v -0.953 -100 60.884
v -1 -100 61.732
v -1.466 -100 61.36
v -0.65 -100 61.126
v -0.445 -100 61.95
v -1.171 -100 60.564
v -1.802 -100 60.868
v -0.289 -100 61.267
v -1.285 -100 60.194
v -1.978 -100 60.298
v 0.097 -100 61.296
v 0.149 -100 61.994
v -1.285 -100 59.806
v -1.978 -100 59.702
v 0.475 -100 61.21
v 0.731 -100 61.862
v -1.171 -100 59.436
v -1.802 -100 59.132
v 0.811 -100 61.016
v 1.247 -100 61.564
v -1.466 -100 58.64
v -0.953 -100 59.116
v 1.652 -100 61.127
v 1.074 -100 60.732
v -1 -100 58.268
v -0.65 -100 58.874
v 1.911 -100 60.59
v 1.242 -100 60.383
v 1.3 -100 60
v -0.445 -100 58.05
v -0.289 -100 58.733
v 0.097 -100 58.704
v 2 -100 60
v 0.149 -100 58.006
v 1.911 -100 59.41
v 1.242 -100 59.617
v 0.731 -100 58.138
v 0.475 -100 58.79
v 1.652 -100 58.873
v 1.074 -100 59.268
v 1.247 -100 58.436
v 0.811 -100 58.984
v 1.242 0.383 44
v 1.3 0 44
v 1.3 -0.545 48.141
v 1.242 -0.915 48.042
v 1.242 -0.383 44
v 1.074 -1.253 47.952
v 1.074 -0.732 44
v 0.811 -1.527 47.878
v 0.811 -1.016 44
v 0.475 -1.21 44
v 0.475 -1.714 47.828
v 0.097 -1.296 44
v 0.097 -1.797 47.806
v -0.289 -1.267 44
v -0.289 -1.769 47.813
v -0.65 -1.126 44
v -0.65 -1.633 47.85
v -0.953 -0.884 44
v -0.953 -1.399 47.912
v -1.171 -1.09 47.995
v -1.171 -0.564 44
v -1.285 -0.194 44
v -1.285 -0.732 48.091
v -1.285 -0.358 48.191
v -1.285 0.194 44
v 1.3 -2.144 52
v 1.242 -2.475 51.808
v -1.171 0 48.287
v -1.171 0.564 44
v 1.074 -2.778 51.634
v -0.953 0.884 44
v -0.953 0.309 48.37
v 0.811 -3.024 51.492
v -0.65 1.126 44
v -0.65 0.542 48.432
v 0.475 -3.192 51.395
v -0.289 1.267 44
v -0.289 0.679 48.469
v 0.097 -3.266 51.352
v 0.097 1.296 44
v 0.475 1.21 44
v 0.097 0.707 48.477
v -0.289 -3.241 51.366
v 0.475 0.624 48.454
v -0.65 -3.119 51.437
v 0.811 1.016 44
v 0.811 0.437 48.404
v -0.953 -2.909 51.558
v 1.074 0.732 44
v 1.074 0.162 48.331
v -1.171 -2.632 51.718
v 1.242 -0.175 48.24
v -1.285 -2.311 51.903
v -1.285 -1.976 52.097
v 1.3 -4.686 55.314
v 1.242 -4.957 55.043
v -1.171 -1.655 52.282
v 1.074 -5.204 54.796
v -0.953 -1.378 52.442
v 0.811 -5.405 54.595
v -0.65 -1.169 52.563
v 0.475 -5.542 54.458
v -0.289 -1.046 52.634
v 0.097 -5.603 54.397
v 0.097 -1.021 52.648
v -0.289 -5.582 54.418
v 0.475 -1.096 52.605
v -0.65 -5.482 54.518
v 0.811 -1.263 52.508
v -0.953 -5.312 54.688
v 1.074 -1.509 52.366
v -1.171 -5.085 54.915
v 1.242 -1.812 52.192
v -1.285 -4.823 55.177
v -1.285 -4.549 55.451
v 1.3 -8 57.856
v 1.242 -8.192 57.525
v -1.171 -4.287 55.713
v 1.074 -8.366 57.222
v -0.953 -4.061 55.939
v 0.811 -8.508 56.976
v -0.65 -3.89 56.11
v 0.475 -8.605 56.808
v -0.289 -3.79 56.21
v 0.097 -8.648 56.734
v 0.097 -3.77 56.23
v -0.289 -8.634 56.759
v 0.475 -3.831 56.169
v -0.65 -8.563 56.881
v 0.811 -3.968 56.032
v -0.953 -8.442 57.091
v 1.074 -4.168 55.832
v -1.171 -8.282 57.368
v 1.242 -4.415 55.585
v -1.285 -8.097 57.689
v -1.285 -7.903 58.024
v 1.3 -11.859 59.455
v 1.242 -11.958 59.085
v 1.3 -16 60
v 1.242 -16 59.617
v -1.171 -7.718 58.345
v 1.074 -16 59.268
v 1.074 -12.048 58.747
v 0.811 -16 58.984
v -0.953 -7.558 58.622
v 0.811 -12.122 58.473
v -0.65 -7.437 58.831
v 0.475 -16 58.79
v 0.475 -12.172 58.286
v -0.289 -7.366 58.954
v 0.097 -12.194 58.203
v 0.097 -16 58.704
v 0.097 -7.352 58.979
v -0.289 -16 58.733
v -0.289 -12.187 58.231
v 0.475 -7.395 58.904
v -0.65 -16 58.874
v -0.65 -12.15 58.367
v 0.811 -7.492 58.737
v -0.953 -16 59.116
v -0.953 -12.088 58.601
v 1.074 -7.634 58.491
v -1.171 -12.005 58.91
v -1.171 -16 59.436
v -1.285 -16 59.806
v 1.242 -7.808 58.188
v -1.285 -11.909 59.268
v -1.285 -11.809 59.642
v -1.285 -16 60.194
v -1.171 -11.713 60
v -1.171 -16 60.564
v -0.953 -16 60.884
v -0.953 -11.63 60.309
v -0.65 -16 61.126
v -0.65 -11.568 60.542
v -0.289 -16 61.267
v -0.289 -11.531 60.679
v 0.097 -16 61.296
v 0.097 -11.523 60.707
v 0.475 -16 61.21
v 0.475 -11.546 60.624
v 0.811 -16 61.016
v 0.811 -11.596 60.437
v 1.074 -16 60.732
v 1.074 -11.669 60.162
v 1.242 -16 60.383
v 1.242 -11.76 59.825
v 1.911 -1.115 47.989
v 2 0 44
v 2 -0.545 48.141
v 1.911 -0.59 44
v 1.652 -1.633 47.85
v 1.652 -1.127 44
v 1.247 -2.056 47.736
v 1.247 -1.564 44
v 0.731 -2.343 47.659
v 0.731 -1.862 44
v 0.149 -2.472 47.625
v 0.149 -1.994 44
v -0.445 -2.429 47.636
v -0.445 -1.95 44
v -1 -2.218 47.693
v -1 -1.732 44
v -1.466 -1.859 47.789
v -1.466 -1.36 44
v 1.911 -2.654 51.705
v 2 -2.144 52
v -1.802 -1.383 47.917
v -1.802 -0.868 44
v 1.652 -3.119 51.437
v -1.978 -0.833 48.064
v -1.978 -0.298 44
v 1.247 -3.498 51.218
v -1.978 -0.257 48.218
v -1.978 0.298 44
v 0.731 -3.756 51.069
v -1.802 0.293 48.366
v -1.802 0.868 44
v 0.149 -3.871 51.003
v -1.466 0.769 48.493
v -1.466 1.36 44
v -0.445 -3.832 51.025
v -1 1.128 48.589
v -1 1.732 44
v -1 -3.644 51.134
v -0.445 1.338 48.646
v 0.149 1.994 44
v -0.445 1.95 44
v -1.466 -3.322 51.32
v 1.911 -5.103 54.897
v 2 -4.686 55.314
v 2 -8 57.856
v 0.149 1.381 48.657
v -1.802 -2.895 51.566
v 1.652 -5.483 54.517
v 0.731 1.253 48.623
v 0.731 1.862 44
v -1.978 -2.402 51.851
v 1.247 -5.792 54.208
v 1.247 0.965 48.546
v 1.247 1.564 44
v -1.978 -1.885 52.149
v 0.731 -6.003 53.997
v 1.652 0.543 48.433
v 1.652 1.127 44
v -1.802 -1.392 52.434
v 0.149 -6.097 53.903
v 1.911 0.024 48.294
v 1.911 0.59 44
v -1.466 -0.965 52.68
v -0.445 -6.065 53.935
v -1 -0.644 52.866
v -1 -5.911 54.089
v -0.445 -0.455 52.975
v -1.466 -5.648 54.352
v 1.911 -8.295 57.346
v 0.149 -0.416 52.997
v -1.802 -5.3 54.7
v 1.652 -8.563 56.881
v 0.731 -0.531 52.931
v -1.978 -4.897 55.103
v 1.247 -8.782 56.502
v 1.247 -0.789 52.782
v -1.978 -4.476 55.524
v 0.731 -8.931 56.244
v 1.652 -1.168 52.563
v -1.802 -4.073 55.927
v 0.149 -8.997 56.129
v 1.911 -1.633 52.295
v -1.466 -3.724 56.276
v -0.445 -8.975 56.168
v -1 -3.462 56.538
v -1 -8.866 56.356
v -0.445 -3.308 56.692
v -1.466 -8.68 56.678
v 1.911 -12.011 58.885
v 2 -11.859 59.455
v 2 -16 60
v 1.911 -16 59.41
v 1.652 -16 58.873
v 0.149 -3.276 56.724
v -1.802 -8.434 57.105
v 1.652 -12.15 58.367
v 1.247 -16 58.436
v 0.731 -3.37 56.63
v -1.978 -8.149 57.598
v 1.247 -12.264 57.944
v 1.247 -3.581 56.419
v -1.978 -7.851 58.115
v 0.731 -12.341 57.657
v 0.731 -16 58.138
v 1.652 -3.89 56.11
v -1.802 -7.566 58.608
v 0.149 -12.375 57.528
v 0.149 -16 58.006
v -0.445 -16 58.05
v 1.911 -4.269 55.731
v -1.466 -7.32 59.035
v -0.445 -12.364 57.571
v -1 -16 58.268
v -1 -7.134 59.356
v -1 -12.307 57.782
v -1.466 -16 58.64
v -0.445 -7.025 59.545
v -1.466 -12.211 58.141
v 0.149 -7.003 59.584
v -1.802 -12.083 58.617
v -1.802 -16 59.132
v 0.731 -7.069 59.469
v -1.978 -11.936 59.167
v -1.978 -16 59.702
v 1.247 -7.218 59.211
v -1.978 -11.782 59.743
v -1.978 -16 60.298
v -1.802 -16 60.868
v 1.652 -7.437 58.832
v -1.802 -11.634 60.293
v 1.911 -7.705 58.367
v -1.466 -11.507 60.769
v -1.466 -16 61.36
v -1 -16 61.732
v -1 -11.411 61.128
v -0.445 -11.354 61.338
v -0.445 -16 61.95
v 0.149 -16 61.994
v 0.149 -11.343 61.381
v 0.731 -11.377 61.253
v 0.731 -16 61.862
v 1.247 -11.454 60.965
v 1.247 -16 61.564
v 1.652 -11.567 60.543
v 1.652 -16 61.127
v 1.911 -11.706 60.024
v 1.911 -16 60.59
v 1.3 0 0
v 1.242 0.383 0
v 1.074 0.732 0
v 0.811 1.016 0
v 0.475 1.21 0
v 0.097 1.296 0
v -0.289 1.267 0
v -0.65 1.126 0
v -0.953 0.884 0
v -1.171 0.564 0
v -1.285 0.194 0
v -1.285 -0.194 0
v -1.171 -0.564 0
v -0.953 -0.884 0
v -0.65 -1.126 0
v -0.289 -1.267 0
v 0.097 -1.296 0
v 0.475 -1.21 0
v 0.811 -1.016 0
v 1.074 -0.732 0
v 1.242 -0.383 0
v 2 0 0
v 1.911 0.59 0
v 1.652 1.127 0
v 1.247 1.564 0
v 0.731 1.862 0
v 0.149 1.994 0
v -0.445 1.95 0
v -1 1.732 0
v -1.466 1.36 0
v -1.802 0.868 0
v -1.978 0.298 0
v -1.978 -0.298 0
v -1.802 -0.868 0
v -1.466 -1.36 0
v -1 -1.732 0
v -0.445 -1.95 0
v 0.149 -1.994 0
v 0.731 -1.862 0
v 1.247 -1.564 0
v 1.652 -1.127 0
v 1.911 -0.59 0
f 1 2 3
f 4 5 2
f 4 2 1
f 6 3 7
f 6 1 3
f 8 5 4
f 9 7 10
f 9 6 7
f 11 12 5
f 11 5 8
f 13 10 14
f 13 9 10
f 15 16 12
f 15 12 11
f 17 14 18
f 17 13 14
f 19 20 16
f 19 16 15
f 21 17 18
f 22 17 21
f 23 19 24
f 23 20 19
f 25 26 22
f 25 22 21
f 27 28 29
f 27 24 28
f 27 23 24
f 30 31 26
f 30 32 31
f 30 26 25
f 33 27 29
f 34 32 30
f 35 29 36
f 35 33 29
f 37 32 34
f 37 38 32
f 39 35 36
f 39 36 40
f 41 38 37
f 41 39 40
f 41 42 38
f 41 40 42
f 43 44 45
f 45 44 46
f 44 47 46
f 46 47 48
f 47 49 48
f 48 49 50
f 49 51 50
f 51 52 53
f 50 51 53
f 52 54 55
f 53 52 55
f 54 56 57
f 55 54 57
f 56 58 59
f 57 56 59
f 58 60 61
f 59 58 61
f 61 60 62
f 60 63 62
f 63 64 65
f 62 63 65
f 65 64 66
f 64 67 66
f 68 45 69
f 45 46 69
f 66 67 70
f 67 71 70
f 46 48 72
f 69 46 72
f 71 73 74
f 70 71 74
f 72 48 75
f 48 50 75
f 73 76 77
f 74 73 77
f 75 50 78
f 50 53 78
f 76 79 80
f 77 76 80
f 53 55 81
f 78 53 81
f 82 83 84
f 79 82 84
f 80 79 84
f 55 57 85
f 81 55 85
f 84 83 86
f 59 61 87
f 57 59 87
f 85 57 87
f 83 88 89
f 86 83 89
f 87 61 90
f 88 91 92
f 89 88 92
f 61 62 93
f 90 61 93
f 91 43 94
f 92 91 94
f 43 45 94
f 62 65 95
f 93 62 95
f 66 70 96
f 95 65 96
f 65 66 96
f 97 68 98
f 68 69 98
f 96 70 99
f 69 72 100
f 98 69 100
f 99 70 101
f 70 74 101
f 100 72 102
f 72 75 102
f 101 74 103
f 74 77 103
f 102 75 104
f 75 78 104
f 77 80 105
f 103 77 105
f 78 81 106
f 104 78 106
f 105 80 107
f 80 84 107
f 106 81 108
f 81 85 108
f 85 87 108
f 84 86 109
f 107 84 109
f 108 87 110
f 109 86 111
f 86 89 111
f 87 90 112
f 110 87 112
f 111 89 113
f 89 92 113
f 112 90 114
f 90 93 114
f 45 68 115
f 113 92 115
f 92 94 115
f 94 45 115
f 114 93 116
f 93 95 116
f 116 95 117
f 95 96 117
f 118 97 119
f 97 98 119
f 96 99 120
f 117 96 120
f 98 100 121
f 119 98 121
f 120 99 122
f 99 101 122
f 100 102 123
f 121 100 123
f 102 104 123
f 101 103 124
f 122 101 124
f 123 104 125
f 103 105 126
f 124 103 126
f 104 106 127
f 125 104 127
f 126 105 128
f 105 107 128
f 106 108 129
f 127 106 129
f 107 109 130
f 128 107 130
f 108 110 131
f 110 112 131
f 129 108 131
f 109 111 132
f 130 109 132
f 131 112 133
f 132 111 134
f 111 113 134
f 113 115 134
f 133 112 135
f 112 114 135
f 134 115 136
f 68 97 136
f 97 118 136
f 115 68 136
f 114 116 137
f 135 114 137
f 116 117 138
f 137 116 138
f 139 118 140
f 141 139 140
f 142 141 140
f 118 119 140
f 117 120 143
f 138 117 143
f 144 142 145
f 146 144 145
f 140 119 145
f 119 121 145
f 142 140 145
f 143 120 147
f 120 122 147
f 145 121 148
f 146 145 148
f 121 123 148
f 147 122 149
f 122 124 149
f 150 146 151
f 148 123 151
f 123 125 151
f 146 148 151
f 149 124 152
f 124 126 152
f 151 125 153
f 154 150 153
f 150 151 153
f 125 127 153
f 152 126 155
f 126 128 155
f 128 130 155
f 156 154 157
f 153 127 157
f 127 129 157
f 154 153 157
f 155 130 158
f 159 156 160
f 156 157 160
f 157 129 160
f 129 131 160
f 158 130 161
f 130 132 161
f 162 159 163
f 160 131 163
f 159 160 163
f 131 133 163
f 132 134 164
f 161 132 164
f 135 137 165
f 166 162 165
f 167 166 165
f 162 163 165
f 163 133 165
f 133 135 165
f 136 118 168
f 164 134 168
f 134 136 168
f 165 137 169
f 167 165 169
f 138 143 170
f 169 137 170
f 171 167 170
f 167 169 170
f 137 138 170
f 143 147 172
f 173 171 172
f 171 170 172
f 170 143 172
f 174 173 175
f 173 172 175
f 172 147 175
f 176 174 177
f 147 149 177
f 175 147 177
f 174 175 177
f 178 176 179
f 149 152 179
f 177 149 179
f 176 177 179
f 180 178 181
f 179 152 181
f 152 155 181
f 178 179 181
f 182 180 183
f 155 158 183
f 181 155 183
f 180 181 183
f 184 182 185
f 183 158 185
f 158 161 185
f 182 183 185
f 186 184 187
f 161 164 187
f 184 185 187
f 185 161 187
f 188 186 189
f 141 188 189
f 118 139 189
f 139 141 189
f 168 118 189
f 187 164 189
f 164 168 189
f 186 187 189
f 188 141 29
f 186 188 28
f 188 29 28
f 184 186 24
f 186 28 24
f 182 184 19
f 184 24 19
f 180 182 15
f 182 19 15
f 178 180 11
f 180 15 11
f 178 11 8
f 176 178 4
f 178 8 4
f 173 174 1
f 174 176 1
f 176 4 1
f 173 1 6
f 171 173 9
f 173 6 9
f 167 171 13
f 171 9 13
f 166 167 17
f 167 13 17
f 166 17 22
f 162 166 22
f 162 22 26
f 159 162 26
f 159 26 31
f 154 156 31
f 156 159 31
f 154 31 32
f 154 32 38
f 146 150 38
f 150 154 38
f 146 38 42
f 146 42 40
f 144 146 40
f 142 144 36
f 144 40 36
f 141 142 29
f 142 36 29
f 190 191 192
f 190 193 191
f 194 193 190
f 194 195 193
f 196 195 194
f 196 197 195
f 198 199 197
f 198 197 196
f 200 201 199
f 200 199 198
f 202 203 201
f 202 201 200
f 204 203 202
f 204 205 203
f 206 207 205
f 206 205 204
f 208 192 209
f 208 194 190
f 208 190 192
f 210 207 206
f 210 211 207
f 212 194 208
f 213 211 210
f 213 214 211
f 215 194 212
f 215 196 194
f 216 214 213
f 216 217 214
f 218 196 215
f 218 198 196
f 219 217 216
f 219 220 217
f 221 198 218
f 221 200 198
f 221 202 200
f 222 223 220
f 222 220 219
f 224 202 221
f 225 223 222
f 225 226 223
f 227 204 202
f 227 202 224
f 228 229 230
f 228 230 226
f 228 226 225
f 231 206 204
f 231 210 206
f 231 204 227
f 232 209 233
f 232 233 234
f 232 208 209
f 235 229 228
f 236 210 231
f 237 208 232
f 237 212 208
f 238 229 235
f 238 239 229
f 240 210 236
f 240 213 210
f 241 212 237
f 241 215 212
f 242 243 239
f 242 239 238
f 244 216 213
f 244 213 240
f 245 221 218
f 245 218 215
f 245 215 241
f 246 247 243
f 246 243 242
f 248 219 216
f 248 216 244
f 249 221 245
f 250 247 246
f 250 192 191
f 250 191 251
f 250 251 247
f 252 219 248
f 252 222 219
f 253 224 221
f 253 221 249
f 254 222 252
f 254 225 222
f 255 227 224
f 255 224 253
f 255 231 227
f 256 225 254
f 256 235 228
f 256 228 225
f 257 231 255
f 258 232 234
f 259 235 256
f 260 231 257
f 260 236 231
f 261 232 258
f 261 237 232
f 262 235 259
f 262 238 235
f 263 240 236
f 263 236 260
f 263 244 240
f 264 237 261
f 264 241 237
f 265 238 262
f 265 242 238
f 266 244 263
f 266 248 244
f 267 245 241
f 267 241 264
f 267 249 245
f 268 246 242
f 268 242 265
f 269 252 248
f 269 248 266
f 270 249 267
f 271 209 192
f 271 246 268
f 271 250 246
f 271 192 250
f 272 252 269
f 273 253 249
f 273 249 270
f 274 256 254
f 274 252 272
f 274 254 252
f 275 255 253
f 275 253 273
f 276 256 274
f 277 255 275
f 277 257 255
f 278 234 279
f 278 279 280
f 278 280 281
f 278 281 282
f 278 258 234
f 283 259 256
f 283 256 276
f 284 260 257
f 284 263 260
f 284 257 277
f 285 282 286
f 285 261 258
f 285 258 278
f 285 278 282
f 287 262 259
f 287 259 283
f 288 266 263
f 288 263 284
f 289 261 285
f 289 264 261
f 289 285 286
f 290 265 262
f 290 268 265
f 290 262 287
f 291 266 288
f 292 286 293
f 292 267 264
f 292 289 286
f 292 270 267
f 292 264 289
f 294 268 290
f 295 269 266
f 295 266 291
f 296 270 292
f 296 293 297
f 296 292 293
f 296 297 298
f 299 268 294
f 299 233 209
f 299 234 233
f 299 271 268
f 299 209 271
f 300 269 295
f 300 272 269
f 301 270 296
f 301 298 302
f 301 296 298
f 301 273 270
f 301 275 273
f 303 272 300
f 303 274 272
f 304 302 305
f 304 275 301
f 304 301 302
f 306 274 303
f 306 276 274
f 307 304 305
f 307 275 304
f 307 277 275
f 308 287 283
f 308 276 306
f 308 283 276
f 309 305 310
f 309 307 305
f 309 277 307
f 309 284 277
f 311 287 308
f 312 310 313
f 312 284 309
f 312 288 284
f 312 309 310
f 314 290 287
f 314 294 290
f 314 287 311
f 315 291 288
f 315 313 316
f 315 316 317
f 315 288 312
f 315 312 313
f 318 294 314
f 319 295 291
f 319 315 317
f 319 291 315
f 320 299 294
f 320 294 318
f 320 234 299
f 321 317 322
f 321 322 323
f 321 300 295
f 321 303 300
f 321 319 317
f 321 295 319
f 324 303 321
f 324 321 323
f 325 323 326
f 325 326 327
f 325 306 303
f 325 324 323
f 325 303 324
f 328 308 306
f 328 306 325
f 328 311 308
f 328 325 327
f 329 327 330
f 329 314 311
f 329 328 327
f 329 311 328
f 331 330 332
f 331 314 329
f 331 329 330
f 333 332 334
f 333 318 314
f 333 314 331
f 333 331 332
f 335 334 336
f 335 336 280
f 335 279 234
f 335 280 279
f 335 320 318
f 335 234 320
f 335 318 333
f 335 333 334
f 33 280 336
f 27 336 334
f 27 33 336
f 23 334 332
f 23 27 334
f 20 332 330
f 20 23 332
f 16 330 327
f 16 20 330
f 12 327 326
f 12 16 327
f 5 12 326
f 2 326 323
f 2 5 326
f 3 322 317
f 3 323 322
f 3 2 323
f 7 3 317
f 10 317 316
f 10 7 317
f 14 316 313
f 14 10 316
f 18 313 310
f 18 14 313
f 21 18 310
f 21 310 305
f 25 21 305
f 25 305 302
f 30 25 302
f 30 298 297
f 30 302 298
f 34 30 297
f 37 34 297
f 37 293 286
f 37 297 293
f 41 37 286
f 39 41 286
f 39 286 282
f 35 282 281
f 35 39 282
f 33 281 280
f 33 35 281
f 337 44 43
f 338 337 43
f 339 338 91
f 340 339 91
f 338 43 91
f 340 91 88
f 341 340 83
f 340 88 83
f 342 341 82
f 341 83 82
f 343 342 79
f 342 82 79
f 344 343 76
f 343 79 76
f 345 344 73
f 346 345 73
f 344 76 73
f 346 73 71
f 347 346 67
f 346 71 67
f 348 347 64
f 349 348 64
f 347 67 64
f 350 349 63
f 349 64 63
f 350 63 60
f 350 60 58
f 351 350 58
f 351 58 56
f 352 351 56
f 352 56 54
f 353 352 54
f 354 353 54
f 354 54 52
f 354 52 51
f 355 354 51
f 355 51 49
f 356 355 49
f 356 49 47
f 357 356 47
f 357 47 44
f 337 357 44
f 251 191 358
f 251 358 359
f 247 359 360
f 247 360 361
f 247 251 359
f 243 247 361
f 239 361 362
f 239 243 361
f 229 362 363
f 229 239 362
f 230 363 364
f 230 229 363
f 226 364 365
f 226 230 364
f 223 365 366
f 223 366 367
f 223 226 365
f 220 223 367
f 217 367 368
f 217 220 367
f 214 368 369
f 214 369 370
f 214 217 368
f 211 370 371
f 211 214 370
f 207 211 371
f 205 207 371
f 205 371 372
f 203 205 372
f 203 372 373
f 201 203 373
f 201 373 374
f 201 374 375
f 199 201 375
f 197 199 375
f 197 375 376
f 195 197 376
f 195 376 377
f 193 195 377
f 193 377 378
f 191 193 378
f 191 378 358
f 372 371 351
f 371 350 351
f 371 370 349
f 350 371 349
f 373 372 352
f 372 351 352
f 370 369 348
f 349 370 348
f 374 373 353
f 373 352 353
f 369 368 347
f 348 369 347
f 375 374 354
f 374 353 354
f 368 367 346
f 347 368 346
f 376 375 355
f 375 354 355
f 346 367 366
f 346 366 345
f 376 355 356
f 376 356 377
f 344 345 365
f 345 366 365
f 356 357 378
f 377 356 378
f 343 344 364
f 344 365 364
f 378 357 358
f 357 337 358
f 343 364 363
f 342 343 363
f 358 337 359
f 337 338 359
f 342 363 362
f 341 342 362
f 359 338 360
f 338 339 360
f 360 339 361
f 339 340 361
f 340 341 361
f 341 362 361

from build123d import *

# Parameters (mm, degrees)
F0_R   = 2
F0_R_2 = 1.3


with BuildPart() as f2:
    # F2: sweep along a path in F1
    with BuildLine(Plane.YZ) as f2_path:
        Line((0, 0), (0, 44))
        ThreePointArc((0, 44), (-4.686291501, 55.313708499), (-16, 60))
        Line((-16, 60), (-100, 60))
    # F0 (on Top) → F2 (sweep)
    with BuildSketch(Plane.XY):
        Circle(F0_R)
        Circle(F0_R_2, mode=Mode.SUBTRACT)
    sweep(path=f2_path.line)


solid = f2.part
